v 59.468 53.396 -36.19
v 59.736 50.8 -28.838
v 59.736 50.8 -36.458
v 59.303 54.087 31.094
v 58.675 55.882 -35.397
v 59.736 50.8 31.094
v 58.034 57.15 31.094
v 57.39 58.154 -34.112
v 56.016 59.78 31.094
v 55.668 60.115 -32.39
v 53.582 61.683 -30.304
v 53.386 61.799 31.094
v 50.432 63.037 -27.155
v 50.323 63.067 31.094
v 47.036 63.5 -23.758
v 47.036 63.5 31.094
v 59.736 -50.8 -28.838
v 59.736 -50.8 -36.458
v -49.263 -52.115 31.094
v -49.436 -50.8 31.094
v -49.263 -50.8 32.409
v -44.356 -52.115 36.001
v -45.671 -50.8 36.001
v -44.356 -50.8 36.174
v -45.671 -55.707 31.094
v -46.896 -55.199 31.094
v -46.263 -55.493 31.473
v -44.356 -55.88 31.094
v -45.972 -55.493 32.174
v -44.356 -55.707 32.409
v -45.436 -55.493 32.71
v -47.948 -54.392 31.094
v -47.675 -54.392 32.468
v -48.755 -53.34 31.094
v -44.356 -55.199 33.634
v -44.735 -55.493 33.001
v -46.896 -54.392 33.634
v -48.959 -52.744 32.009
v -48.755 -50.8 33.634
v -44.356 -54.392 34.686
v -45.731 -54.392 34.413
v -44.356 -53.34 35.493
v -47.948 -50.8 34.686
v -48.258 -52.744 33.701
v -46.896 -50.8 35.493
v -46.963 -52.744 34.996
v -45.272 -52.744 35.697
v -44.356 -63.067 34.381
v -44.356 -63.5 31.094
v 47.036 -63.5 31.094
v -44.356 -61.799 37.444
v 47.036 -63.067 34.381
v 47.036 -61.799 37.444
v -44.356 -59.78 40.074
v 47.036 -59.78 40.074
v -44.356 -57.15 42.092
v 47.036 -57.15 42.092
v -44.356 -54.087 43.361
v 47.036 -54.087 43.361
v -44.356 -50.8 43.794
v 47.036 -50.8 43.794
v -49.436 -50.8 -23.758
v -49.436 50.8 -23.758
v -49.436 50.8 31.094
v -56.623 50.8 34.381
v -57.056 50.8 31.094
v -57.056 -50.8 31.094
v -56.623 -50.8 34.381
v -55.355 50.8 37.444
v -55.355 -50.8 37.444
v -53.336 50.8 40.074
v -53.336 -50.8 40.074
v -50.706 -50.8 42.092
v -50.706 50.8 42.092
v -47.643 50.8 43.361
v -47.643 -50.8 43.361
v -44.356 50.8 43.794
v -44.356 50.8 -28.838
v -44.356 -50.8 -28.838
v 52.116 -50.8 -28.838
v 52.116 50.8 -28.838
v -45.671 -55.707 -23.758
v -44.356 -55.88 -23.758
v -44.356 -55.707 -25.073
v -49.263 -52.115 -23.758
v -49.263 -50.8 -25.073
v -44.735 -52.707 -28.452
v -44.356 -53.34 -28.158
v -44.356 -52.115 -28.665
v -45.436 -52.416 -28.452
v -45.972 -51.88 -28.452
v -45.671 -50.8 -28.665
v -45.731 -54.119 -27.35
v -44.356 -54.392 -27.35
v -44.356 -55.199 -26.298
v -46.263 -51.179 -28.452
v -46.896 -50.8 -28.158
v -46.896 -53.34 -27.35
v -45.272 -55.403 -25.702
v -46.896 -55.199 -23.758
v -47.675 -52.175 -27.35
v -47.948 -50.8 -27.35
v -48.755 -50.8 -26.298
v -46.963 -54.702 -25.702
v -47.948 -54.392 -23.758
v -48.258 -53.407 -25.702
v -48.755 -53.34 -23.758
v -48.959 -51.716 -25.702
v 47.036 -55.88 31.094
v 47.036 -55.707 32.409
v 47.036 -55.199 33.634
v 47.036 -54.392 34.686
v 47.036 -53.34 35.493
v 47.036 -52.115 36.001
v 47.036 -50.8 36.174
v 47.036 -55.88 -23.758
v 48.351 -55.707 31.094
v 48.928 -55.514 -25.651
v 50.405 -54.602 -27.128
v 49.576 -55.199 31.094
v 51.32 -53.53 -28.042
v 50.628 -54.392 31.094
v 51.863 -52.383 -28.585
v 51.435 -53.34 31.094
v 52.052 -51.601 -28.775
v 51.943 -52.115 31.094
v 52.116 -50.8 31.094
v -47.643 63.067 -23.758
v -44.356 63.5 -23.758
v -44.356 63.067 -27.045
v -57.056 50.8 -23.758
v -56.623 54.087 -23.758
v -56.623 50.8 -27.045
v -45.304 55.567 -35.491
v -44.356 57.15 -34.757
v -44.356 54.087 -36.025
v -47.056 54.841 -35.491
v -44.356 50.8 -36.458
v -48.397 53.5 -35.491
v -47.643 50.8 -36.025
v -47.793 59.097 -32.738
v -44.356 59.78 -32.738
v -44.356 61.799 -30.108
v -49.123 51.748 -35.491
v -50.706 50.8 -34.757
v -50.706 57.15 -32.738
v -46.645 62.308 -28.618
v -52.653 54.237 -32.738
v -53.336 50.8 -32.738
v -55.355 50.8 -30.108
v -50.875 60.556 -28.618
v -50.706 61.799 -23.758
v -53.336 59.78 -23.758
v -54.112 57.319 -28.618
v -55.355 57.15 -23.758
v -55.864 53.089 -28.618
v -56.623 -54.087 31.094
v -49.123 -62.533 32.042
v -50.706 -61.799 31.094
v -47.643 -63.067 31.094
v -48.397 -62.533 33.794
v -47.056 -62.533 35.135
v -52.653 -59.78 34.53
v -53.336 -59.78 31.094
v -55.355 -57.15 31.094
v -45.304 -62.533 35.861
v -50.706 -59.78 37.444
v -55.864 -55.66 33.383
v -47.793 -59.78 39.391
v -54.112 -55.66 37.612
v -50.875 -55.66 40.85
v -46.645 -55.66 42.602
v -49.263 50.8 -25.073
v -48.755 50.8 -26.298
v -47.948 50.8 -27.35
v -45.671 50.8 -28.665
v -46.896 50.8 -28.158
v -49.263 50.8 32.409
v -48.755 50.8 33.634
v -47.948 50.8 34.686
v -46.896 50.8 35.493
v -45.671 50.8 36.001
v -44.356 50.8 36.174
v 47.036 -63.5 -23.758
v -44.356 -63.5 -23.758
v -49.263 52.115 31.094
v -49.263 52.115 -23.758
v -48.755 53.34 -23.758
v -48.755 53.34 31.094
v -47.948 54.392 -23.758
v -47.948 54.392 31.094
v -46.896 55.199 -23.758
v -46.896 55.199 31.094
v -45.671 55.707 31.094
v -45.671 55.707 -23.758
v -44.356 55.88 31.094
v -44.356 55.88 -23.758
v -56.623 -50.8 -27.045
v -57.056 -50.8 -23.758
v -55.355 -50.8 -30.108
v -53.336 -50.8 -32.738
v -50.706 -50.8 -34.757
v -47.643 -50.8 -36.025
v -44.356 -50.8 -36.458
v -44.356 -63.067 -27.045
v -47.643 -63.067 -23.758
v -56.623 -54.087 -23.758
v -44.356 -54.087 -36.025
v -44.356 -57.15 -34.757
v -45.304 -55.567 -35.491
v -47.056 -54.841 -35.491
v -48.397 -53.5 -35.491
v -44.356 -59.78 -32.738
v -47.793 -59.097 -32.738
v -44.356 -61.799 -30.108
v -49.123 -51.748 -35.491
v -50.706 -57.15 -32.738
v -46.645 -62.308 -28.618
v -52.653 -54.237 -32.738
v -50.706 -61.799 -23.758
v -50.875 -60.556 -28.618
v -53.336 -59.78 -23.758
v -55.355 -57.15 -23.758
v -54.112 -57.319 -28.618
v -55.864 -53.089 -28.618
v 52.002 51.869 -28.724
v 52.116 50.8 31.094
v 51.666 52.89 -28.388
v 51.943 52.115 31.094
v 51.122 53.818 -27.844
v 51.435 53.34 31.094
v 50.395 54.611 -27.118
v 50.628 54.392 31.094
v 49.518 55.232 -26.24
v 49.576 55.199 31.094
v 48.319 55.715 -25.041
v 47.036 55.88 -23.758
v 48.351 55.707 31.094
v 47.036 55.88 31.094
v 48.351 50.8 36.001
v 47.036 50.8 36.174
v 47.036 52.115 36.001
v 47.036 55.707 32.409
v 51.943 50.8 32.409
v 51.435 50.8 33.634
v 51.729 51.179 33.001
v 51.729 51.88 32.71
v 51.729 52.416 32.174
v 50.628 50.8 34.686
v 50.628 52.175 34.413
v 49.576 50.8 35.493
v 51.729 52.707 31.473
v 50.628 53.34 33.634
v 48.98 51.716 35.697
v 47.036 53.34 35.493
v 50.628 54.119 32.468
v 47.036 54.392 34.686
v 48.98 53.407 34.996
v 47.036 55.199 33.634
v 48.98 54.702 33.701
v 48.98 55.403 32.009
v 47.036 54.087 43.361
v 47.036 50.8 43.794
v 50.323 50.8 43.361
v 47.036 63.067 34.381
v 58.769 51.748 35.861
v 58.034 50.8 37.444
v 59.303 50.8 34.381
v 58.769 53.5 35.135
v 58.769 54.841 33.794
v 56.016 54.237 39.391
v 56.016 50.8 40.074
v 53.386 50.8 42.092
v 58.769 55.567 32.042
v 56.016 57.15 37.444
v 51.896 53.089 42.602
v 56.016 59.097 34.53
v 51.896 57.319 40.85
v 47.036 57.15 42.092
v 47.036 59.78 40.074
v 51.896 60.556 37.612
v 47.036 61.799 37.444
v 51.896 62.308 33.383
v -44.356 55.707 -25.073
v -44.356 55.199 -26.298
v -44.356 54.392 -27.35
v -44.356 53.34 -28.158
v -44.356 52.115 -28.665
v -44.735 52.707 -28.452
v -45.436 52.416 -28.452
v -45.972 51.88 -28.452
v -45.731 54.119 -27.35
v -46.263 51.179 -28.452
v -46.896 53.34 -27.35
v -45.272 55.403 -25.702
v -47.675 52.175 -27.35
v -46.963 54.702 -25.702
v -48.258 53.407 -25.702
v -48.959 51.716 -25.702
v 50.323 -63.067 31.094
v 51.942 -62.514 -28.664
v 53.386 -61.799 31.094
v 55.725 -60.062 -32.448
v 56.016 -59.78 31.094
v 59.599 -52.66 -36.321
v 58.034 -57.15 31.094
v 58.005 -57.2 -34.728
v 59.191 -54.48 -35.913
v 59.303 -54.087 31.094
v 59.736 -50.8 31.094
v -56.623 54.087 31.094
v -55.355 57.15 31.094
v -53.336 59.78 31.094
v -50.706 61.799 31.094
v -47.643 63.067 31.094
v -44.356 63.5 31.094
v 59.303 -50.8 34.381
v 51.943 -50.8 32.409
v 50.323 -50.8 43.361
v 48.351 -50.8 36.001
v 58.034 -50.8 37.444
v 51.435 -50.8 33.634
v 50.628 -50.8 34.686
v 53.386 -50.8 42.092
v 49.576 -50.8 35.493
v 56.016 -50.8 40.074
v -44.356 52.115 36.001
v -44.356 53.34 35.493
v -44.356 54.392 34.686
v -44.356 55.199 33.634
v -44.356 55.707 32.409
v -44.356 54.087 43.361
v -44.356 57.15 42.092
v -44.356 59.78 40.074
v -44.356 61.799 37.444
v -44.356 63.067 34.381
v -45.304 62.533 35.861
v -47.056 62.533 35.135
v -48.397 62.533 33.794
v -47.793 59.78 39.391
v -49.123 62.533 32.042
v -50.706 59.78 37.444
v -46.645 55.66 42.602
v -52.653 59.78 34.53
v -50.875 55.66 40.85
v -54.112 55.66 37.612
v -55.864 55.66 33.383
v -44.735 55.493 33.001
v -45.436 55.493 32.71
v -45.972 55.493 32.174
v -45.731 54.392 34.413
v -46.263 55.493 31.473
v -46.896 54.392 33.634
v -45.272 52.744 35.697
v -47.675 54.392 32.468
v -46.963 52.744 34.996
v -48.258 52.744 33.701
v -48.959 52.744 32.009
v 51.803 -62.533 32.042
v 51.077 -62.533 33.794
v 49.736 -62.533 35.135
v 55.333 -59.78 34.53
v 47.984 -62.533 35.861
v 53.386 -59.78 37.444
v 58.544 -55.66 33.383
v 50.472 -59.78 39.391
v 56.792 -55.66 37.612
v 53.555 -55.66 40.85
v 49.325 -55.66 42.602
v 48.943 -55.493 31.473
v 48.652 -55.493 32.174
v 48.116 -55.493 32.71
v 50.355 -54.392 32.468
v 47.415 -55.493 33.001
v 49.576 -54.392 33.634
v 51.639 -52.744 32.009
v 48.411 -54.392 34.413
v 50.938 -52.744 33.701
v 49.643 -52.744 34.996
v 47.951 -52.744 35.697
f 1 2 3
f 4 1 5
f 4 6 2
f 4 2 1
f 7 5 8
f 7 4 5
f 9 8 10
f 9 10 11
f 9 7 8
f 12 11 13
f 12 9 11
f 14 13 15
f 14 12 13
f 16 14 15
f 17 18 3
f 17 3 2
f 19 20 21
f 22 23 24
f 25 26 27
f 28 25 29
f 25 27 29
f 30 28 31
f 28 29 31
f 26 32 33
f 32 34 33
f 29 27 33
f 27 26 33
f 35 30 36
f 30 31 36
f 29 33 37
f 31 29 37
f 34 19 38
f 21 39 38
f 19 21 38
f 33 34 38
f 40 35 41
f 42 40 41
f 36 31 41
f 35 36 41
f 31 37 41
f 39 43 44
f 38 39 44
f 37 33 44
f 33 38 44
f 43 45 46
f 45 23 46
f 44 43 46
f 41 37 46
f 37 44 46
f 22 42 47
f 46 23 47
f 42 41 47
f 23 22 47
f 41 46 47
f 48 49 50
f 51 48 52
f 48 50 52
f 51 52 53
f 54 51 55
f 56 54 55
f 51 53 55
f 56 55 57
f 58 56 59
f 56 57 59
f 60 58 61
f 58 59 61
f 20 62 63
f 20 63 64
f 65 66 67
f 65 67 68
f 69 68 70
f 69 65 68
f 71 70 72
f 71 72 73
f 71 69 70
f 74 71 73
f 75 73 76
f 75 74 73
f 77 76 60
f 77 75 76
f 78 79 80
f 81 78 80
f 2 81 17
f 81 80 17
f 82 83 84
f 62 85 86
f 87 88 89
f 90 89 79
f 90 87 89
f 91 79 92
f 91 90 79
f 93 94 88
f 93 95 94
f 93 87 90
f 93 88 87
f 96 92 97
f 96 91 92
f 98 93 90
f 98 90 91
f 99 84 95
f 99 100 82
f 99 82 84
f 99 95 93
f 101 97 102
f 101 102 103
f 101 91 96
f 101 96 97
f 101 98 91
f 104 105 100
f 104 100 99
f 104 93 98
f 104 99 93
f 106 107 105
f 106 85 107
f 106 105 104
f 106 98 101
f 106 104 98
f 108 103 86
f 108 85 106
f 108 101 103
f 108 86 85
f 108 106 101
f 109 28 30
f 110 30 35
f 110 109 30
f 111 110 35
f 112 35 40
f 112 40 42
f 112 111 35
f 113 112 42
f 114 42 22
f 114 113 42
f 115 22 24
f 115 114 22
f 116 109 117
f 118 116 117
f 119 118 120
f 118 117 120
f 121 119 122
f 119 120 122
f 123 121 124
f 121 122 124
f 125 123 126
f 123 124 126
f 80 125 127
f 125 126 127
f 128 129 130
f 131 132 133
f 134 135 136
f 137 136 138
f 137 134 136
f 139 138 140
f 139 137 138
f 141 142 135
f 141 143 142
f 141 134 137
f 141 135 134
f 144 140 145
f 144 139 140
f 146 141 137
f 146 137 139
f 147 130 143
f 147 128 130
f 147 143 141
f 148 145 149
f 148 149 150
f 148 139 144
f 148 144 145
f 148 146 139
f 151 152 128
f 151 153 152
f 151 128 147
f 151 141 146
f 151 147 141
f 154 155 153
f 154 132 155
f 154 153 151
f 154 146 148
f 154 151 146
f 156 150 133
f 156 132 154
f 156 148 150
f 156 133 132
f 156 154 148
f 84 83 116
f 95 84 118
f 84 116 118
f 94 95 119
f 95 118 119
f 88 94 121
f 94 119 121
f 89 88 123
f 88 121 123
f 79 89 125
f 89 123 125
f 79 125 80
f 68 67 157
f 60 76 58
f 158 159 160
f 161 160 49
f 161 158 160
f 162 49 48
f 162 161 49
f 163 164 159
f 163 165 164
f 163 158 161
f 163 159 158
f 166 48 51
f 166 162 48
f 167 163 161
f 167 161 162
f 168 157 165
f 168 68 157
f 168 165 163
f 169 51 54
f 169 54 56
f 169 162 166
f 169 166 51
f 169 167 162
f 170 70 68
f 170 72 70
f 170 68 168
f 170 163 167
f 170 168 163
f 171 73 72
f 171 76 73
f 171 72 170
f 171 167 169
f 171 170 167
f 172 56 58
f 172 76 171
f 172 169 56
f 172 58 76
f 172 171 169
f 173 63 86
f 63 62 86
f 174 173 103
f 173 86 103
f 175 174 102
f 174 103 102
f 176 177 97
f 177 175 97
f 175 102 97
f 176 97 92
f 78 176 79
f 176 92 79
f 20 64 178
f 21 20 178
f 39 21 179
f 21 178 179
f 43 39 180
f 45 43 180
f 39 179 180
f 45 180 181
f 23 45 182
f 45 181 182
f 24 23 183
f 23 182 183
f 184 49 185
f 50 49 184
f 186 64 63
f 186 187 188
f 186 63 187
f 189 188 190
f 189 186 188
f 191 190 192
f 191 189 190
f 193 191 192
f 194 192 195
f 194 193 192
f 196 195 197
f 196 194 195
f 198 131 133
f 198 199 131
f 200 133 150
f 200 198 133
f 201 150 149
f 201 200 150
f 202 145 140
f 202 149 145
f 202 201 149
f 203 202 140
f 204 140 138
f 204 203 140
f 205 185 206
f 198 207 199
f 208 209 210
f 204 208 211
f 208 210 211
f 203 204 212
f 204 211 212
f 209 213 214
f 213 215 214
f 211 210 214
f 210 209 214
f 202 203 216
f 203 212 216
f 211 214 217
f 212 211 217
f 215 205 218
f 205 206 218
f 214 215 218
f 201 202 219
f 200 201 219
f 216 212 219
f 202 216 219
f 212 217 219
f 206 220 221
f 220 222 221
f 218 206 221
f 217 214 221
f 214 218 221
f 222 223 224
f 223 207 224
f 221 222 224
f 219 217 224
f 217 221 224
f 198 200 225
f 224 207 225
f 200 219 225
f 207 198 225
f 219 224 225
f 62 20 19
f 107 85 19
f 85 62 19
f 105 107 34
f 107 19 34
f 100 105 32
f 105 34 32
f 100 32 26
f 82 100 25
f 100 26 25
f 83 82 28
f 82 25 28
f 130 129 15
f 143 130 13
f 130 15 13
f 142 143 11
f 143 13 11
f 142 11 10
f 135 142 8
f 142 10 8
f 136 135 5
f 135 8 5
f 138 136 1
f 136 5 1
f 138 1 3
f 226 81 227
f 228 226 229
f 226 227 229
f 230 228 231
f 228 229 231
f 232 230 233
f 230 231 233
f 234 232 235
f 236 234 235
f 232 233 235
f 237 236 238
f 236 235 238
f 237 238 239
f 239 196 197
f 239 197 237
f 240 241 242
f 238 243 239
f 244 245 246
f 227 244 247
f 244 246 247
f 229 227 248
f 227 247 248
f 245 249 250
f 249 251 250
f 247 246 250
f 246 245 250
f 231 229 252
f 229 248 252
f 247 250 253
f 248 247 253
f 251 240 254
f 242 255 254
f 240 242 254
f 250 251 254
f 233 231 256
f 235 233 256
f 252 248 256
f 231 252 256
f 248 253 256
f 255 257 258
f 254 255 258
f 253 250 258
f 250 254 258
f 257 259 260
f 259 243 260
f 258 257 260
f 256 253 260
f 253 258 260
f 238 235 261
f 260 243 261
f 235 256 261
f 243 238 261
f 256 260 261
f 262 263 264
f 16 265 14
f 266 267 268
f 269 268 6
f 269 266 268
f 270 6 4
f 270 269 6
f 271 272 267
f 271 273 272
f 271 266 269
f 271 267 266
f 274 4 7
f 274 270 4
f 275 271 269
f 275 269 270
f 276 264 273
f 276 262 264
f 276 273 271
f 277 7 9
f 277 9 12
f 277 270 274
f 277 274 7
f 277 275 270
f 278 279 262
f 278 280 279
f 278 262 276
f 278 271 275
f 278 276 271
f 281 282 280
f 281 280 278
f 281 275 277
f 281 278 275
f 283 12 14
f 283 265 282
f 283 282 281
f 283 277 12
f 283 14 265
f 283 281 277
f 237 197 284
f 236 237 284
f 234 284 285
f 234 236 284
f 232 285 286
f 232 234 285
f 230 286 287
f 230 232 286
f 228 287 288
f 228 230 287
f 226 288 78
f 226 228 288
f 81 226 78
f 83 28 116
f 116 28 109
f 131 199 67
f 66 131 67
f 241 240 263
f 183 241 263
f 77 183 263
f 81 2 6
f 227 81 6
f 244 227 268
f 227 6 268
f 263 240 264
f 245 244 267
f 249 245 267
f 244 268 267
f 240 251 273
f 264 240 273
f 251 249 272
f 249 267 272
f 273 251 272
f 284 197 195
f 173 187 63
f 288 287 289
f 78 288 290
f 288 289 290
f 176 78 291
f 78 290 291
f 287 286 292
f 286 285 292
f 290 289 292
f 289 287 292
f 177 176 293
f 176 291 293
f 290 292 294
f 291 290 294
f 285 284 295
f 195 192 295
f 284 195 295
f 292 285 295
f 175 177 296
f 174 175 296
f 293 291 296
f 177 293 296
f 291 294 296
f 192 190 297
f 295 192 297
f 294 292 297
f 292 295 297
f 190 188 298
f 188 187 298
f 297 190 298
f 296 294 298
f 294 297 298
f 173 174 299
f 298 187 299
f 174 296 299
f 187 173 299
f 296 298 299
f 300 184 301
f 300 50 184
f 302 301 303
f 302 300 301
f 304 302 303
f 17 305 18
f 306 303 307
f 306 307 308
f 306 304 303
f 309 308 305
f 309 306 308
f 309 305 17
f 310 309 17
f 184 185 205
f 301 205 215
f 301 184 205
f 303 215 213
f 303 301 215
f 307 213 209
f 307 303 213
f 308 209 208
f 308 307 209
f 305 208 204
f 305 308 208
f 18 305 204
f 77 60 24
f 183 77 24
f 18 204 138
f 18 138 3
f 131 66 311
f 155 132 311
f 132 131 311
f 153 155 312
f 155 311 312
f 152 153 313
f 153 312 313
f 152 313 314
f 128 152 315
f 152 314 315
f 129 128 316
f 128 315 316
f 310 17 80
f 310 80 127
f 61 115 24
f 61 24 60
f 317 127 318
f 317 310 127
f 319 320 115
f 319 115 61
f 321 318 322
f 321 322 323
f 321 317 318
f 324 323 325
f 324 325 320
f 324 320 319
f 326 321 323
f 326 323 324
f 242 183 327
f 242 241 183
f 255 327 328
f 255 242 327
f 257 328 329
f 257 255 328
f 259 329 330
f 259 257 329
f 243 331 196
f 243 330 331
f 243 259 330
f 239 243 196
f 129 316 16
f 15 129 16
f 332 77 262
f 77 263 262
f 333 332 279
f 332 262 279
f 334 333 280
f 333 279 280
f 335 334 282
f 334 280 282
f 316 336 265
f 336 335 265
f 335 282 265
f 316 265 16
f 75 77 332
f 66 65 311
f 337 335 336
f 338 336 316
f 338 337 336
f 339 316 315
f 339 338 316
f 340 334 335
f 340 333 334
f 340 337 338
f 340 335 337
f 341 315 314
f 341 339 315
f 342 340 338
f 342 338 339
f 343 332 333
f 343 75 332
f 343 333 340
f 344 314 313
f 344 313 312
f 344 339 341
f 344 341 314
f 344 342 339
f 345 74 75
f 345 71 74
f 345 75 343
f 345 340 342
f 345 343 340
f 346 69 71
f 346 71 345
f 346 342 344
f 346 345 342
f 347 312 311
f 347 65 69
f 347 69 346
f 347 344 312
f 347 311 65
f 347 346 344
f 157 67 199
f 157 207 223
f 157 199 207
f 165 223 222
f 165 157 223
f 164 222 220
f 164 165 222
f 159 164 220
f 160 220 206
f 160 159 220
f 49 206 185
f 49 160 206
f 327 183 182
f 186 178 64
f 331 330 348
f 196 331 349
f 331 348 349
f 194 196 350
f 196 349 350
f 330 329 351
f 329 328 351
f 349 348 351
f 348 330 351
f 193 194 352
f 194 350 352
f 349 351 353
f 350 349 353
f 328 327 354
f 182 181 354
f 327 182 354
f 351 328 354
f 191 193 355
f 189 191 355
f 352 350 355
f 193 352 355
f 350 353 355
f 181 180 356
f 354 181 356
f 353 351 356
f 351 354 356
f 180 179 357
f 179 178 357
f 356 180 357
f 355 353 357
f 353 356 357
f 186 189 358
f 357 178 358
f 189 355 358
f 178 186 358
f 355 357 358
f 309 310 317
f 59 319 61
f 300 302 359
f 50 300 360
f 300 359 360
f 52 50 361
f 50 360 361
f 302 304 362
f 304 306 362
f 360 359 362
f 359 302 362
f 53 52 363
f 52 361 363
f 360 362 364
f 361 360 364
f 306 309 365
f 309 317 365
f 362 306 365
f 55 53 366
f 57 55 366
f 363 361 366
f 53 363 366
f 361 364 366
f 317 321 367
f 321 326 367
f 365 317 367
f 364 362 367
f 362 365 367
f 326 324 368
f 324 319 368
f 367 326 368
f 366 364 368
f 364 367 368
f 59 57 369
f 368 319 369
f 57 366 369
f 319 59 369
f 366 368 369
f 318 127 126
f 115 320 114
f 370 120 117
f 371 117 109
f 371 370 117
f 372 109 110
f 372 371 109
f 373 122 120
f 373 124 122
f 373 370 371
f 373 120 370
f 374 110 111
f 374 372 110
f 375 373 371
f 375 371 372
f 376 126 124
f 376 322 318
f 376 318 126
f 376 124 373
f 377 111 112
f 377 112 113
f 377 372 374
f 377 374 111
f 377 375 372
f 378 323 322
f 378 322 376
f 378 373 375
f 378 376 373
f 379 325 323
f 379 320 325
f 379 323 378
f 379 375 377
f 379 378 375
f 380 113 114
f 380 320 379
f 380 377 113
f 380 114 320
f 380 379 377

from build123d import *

# Parameters (mm, degrees)
F0_W     = 116.7918927968
F0_H     = 80.2520625293
F1_DEPTH = 63.5
F2_R     = 12.7
F3_T     = 7.62


# Not quite as in the source:
# - a shell that OpenCascade refuses in one call is made with other operations: the cavity is built on its own and cut out


with BuildPart() as f1:
    # F0 (on Front) → F1 (new body, symmetric)
    with BuildSketch(Plane.XZ):
        with Locations((1.3399217278, 3.6678072065)):
            Rectangle(F0_W, F0_H)
    extrude(amount=F1_DEPTH, both=True)

    # F2
    f2_edges = [f1.edges().sort_by_distance(p)[0] for p in [
        (-57.056025, 0, 43.793838),
        (1.339922, 63.5, 43.793838),
        (59.735868, 0, 43.793838),
        (-57.056025, -63.5, 3.667807),
        (-57.056025, 63.5, 3.667807),
        (59.735868, -63.5, 3.667807),
        (59.735868, 63.5, 3.667807),
        (1.339922, 63.5, -36.458224),
        (1.339922, -63.5, -36.458224),
        (-57.056025, 0, -36.458224),
        (1.339922, -63.5, 43.793838),
    ]]
    fillet(f2_edges, radius=F2_R)

    # F3: shell of thickness 7.62, made by hand


with BuildPart() as f3_core1:
    # F3_t2: copy of F1
    add(f1.part)

    # the walls: a layer under each face that stays
    f3_faces = [f3_core1.faces().sort_by_distance(p)[0] for p in [
        (-53.3362807917, 0, 40.0740945922),
        (1.3399217278, 59.7802561211, 40.0740945922),
        (1.3399217278, -59.7802561211, 40.0740945922),
        (-50.7060246706, 59.7802561211, 37.4438384712),
        (-50.7060246706, -59.7802561211, 37.4438384712),
        (-57.0560246706, 0, 3.6678072065),
        (56.0161242472, 57.15, 37.4438384712),
        (1.3399217278, 63.5, 3.6678072065),
        (53.3858681262, -59.7802561211, 37.4438384712),
        (1.3399217278, -63.5, 3.6678072065),
        (-53.3362807917, 59.7802561211, 3.6678072065),
        (-53.3362807917, -59.7802561211, 3.6678072065),
        (-53.3362807917, 0, -32.7384801792),
        (56.0161242472, 59.7802561211, -2.6821927935),
        (7.6899217278, 59.7802561211, -32.7384801792),
        (56.0161240867, -59.7802562816, -2.6821927935),
        (7.6899217278, -59.7802562816, -32.7384800187),
        (7.6899217278, 0, -36.4582240582),
        (-50.7060246706, 57.15, -32.7384801792),
        (-50.7060246706, -57.15, -32.7384801792),
    ]]
    thicken(f3_faces, amount=-F3_T, mode=Mode.SUBTRACT)


with BuildPart() as f1_1:
    add(f1.part)

    # what is left inside the walls is the cavity
    f3_cavity = [f3_core1.part.solids().sort_by_distance(p)[0] for p in [
        (7.689922, 16.933333, -28.762024),
    ]]
    add(f3_cavity, mode=Mode.SUBTRACT)


solid = f1_1.part
